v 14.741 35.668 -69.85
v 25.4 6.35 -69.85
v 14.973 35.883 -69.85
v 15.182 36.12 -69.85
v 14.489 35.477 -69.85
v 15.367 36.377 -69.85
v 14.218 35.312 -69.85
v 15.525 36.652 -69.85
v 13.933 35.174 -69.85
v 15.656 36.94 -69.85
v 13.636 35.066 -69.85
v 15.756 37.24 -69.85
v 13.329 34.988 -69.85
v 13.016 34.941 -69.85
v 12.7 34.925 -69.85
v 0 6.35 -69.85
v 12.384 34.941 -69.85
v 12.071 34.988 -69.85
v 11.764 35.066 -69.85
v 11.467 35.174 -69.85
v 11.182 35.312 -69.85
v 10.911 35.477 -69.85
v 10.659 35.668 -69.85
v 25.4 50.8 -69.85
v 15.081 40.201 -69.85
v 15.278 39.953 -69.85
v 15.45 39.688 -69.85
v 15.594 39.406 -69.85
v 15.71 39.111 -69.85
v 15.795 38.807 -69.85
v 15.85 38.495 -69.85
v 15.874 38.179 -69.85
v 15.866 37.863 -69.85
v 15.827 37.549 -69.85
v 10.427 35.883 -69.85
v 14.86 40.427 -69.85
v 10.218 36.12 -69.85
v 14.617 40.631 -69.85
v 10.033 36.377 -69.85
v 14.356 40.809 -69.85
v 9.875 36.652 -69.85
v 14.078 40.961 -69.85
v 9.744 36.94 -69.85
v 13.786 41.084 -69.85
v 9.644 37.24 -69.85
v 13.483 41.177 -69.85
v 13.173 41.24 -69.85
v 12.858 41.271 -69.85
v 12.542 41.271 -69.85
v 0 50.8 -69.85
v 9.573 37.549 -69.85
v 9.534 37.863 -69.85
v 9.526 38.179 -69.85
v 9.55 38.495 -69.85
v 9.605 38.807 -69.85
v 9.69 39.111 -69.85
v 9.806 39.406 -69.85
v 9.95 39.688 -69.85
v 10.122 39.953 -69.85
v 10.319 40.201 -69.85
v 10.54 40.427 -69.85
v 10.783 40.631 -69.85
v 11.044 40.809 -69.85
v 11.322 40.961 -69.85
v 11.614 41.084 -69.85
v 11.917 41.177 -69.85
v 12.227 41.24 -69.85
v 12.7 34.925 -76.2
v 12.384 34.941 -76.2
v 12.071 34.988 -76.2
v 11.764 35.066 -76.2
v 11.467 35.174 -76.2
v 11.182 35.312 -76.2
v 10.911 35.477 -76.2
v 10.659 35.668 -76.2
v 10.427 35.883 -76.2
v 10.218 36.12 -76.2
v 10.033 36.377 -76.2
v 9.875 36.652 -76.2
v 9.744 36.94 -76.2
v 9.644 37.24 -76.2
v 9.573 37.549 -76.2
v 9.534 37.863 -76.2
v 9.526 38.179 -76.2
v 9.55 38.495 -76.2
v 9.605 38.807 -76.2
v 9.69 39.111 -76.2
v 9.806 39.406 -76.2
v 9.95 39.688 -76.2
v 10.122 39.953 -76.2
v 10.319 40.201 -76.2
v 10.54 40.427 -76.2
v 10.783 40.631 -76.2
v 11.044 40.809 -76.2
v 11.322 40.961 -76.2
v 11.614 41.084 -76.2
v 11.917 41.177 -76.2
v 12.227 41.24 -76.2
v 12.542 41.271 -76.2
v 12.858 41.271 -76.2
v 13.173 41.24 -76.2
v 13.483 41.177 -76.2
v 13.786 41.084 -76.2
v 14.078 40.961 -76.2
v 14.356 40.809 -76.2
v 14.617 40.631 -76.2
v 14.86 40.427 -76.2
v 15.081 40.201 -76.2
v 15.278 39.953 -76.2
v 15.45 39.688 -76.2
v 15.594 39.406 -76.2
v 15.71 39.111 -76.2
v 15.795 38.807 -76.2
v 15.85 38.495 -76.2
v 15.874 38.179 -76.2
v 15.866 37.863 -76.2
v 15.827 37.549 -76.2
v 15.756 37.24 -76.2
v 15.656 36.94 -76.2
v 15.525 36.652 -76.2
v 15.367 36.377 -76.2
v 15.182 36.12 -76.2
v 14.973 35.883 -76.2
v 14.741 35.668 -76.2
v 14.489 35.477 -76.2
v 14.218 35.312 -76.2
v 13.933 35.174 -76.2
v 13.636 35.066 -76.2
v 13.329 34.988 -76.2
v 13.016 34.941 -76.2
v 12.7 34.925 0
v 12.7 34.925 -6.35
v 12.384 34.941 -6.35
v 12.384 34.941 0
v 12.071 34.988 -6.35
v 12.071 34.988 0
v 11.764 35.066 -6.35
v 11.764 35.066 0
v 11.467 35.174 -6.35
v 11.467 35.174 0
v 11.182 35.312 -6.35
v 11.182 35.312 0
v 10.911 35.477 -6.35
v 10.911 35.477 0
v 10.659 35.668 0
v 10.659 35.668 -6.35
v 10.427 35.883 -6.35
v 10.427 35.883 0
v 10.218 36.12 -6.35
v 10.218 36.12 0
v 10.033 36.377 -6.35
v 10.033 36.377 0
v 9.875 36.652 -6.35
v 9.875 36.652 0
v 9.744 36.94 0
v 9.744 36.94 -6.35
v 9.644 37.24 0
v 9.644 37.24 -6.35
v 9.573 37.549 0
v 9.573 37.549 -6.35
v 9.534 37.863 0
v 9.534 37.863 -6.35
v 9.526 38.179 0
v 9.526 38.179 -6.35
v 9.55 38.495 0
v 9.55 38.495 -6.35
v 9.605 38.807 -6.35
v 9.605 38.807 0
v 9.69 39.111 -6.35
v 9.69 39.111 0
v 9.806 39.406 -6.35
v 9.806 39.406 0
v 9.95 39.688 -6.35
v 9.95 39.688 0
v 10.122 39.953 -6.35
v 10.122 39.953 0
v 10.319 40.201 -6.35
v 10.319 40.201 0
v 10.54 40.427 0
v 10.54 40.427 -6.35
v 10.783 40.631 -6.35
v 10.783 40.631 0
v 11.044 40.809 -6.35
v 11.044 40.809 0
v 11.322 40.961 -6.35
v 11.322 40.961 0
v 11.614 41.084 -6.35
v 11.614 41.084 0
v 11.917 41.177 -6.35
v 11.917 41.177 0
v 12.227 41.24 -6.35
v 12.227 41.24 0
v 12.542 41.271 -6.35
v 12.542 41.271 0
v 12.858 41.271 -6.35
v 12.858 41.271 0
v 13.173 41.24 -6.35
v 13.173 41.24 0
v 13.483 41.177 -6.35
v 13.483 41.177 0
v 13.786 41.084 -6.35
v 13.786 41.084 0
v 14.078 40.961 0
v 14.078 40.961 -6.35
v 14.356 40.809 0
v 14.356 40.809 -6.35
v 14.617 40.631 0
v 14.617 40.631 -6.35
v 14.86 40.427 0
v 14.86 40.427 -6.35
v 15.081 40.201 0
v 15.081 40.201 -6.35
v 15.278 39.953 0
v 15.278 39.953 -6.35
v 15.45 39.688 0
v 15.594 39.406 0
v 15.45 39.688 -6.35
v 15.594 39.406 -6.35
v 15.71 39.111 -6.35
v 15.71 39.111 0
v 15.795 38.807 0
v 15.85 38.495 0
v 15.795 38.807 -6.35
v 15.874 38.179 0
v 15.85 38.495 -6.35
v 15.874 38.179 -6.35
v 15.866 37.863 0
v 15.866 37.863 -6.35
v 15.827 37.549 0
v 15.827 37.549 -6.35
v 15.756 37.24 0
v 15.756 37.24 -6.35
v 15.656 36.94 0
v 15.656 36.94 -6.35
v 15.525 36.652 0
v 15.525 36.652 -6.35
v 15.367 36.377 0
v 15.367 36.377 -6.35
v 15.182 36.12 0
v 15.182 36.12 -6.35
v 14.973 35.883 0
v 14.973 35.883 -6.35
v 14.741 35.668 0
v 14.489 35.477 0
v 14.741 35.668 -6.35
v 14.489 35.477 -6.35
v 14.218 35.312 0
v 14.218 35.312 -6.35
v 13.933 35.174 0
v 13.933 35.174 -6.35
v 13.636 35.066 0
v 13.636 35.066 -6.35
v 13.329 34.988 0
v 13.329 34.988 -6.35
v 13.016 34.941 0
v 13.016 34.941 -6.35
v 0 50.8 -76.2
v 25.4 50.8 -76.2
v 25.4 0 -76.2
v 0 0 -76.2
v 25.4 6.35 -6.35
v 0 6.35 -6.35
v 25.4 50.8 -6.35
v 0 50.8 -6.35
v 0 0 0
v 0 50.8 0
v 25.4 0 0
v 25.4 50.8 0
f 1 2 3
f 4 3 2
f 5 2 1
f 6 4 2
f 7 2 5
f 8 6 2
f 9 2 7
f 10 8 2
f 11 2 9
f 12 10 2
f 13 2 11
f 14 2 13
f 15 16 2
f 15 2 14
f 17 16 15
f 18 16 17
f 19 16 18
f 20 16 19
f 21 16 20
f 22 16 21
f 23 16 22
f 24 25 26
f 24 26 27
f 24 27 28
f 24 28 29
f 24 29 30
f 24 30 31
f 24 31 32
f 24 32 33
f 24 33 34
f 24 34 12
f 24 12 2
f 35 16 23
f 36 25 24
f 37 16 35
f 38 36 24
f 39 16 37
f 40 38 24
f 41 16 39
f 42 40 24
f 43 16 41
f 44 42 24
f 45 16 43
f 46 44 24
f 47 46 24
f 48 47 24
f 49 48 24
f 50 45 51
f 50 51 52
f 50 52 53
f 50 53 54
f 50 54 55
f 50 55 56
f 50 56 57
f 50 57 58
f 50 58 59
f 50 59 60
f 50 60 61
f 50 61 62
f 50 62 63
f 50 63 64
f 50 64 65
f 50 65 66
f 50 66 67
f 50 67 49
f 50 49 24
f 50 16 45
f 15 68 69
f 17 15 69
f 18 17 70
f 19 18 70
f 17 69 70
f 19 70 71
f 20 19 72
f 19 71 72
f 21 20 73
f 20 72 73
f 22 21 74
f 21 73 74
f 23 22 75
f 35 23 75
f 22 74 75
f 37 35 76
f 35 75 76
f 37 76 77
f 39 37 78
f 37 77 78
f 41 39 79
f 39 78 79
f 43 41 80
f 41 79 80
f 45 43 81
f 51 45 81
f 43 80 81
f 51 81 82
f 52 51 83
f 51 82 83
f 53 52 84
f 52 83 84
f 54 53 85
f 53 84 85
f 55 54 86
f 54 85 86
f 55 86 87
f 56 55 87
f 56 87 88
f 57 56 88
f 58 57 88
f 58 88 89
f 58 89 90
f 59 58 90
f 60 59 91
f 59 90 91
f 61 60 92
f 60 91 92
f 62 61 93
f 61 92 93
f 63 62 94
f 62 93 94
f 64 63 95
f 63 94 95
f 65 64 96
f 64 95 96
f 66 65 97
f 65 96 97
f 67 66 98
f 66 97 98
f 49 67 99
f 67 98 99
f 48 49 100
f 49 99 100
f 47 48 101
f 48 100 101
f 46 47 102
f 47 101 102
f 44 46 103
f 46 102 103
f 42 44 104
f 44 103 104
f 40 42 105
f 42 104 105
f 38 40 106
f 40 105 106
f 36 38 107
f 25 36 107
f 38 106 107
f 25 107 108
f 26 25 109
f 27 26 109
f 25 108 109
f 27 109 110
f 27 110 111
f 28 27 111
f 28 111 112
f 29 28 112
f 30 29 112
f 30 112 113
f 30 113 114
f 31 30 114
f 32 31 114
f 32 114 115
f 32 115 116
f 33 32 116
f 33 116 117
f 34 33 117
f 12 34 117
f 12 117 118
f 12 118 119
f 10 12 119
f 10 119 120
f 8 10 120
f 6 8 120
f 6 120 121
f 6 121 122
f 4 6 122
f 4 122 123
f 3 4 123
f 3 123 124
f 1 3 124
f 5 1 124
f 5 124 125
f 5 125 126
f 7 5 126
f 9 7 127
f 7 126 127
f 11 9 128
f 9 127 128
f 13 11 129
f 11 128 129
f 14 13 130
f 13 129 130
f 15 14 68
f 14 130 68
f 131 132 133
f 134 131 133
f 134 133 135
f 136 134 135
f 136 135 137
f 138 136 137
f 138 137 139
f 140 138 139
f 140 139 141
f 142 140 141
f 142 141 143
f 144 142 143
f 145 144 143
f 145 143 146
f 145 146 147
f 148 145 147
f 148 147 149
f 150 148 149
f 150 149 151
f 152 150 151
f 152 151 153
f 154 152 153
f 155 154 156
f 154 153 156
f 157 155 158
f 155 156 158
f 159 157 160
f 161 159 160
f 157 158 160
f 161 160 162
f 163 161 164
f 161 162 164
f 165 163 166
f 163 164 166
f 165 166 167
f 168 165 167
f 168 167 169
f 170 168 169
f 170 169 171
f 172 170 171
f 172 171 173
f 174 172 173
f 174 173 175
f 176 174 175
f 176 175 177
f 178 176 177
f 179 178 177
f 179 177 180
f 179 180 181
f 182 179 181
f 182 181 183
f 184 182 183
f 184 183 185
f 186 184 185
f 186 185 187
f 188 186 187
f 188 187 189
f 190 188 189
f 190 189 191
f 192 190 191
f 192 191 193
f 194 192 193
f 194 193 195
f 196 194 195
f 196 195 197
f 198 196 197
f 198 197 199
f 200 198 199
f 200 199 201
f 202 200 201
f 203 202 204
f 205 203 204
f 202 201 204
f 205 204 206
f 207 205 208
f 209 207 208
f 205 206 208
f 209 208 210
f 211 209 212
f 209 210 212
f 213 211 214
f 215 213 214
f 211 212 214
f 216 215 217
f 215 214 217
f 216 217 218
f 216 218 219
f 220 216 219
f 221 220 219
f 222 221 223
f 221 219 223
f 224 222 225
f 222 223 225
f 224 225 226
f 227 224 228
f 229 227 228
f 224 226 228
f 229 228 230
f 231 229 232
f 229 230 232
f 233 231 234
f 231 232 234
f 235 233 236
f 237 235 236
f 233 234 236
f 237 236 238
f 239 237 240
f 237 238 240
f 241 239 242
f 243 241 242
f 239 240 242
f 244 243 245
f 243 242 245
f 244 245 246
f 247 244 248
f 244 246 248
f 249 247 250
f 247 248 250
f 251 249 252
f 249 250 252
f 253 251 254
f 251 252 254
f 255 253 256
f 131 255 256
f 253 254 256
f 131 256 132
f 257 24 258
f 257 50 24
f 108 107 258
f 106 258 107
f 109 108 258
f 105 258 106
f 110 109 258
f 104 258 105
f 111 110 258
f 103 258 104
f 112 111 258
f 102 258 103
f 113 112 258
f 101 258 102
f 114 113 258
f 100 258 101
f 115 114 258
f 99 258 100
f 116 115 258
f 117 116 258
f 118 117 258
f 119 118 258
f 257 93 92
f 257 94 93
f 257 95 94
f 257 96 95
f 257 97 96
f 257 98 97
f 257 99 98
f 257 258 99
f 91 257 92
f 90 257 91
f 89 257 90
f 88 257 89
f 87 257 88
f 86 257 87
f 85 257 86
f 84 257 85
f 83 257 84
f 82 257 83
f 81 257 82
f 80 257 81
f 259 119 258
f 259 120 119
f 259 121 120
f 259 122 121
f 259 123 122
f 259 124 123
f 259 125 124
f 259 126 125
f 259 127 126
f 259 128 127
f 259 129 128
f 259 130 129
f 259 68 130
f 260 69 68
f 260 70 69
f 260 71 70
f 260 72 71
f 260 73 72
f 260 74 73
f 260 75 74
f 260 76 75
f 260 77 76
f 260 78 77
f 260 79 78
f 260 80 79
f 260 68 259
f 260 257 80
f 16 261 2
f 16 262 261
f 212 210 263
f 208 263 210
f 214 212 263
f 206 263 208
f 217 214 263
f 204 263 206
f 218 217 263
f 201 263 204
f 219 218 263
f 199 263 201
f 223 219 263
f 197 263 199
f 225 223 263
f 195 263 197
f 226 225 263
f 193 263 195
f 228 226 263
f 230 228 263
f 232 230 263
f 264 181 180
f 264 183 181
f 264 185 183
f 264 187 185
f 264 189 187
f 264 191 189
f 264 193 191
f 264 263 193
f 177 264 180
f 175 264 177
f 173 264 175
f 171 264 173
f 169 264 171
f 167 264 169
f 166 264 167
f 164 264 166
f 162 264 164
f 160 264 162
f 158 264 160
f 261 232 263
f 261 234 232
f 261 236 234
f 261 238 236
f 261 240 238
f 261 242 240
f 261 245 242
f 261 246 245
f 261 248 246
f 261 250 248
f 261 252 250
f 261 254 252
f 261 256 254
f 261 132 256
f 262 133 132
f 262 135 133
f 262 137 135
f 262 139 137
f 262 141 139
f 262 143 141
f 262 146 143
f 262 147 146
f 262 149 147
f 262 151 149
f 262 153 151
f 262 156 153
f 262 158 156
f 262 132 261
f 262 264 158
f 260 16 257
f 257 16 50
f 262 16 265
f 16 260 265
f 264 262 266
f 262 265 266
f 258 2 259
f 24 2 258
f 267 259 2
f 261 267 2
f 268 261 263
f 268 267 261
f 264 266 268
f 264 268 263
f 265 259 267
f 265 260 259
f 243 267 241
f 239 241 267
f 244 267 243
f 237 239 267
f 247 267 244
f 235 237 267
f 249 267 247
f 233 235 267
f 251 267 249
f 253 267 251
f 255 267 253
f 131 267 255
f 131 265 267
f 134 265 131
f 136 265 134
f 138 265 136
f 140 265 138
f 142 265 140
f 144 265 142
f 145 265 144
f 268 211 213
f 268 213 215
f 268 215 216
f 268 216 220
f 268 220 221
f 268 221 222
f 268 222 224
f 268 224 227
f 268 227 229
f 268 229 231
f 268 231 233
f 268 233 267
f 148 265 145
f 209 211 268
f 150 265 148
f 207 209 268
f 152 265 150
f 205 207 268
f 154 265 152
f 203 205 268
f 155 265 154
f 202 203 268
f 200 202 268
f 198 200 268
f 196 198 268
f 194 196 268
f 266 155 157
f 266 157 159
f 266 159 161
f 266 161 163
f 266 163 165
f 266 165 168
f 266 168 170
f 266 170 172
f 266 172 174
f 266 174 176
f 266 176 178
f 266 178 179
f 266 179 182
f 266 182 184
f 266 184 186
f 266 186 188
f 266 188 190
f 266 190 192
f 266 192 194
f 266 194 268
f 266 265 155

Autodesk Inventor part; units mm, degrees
ref_plane "YZ Plane" through (0, 0, 0) normal (1, 0, 0) x (0, 1, 0)
ref_plane "XZ Plane" through (0, 0, 0) normal (0, 1, 0) x (-1, 0, 0)
ref_plane "XY Plane" through (0, 0, 0) normal (0, 0, 1) x (1, 0, 0)
sketch "Sketch1" plane through (0, 0, 0) normal (1, 0, 0) x (0, 1, 0)
  line L0 (0, 0) -> (50.8, 0)
  line L1 (50.8, 0) -> (50.8, -76.2)
  line L2 (50.8, -76.2) -> (0, -76.2)
  line L3 (0, -76.2) -> (0, 0)
  line L4 (50.8, -6.35) -> (6.35, -6.35)
  line L5 (6.35, -6.35) -> (6.35, -69.85)
  line L6 (6.35, -69.85) -> (50.8, -69.85)
  line L7 (50.8, -69.85) -> (50.8, -6.35)
  dimension "d0" = 50.8
  dimension "d1" = 76.2
  dimension "d2" = 6.35
  dimension "d3" = 6.35
  dimension "d4" = 6.35
extrude "Extrusion1" add sketch "Sketch1" along normal blind 25.4 contours L0 L1 L4 L5 L6 L2 L3
sketch "Sketch2" plane through (0, 0, 0) normal (0, 0, 1) x (1, 0, 0)
  line L0 (0, 50.8) -> (0, 0) projected
  line L1 (0, 0) -> (25.4, 0) projected
  line L2 (25.4, 50.8) -> (25.4, 0) projected
  line L3 (0, 50.8) -> (25.4, 50.8) projected
  point P0 (12.7, 38.1)
  dimension "d7" = 12.7
  dimension "d8" = 12.7
hole "Hole1" at (12.7, 38.1, 0) direction (0, 0, -1) diameter 6.35 end through all
properties part number "StressProngs"
